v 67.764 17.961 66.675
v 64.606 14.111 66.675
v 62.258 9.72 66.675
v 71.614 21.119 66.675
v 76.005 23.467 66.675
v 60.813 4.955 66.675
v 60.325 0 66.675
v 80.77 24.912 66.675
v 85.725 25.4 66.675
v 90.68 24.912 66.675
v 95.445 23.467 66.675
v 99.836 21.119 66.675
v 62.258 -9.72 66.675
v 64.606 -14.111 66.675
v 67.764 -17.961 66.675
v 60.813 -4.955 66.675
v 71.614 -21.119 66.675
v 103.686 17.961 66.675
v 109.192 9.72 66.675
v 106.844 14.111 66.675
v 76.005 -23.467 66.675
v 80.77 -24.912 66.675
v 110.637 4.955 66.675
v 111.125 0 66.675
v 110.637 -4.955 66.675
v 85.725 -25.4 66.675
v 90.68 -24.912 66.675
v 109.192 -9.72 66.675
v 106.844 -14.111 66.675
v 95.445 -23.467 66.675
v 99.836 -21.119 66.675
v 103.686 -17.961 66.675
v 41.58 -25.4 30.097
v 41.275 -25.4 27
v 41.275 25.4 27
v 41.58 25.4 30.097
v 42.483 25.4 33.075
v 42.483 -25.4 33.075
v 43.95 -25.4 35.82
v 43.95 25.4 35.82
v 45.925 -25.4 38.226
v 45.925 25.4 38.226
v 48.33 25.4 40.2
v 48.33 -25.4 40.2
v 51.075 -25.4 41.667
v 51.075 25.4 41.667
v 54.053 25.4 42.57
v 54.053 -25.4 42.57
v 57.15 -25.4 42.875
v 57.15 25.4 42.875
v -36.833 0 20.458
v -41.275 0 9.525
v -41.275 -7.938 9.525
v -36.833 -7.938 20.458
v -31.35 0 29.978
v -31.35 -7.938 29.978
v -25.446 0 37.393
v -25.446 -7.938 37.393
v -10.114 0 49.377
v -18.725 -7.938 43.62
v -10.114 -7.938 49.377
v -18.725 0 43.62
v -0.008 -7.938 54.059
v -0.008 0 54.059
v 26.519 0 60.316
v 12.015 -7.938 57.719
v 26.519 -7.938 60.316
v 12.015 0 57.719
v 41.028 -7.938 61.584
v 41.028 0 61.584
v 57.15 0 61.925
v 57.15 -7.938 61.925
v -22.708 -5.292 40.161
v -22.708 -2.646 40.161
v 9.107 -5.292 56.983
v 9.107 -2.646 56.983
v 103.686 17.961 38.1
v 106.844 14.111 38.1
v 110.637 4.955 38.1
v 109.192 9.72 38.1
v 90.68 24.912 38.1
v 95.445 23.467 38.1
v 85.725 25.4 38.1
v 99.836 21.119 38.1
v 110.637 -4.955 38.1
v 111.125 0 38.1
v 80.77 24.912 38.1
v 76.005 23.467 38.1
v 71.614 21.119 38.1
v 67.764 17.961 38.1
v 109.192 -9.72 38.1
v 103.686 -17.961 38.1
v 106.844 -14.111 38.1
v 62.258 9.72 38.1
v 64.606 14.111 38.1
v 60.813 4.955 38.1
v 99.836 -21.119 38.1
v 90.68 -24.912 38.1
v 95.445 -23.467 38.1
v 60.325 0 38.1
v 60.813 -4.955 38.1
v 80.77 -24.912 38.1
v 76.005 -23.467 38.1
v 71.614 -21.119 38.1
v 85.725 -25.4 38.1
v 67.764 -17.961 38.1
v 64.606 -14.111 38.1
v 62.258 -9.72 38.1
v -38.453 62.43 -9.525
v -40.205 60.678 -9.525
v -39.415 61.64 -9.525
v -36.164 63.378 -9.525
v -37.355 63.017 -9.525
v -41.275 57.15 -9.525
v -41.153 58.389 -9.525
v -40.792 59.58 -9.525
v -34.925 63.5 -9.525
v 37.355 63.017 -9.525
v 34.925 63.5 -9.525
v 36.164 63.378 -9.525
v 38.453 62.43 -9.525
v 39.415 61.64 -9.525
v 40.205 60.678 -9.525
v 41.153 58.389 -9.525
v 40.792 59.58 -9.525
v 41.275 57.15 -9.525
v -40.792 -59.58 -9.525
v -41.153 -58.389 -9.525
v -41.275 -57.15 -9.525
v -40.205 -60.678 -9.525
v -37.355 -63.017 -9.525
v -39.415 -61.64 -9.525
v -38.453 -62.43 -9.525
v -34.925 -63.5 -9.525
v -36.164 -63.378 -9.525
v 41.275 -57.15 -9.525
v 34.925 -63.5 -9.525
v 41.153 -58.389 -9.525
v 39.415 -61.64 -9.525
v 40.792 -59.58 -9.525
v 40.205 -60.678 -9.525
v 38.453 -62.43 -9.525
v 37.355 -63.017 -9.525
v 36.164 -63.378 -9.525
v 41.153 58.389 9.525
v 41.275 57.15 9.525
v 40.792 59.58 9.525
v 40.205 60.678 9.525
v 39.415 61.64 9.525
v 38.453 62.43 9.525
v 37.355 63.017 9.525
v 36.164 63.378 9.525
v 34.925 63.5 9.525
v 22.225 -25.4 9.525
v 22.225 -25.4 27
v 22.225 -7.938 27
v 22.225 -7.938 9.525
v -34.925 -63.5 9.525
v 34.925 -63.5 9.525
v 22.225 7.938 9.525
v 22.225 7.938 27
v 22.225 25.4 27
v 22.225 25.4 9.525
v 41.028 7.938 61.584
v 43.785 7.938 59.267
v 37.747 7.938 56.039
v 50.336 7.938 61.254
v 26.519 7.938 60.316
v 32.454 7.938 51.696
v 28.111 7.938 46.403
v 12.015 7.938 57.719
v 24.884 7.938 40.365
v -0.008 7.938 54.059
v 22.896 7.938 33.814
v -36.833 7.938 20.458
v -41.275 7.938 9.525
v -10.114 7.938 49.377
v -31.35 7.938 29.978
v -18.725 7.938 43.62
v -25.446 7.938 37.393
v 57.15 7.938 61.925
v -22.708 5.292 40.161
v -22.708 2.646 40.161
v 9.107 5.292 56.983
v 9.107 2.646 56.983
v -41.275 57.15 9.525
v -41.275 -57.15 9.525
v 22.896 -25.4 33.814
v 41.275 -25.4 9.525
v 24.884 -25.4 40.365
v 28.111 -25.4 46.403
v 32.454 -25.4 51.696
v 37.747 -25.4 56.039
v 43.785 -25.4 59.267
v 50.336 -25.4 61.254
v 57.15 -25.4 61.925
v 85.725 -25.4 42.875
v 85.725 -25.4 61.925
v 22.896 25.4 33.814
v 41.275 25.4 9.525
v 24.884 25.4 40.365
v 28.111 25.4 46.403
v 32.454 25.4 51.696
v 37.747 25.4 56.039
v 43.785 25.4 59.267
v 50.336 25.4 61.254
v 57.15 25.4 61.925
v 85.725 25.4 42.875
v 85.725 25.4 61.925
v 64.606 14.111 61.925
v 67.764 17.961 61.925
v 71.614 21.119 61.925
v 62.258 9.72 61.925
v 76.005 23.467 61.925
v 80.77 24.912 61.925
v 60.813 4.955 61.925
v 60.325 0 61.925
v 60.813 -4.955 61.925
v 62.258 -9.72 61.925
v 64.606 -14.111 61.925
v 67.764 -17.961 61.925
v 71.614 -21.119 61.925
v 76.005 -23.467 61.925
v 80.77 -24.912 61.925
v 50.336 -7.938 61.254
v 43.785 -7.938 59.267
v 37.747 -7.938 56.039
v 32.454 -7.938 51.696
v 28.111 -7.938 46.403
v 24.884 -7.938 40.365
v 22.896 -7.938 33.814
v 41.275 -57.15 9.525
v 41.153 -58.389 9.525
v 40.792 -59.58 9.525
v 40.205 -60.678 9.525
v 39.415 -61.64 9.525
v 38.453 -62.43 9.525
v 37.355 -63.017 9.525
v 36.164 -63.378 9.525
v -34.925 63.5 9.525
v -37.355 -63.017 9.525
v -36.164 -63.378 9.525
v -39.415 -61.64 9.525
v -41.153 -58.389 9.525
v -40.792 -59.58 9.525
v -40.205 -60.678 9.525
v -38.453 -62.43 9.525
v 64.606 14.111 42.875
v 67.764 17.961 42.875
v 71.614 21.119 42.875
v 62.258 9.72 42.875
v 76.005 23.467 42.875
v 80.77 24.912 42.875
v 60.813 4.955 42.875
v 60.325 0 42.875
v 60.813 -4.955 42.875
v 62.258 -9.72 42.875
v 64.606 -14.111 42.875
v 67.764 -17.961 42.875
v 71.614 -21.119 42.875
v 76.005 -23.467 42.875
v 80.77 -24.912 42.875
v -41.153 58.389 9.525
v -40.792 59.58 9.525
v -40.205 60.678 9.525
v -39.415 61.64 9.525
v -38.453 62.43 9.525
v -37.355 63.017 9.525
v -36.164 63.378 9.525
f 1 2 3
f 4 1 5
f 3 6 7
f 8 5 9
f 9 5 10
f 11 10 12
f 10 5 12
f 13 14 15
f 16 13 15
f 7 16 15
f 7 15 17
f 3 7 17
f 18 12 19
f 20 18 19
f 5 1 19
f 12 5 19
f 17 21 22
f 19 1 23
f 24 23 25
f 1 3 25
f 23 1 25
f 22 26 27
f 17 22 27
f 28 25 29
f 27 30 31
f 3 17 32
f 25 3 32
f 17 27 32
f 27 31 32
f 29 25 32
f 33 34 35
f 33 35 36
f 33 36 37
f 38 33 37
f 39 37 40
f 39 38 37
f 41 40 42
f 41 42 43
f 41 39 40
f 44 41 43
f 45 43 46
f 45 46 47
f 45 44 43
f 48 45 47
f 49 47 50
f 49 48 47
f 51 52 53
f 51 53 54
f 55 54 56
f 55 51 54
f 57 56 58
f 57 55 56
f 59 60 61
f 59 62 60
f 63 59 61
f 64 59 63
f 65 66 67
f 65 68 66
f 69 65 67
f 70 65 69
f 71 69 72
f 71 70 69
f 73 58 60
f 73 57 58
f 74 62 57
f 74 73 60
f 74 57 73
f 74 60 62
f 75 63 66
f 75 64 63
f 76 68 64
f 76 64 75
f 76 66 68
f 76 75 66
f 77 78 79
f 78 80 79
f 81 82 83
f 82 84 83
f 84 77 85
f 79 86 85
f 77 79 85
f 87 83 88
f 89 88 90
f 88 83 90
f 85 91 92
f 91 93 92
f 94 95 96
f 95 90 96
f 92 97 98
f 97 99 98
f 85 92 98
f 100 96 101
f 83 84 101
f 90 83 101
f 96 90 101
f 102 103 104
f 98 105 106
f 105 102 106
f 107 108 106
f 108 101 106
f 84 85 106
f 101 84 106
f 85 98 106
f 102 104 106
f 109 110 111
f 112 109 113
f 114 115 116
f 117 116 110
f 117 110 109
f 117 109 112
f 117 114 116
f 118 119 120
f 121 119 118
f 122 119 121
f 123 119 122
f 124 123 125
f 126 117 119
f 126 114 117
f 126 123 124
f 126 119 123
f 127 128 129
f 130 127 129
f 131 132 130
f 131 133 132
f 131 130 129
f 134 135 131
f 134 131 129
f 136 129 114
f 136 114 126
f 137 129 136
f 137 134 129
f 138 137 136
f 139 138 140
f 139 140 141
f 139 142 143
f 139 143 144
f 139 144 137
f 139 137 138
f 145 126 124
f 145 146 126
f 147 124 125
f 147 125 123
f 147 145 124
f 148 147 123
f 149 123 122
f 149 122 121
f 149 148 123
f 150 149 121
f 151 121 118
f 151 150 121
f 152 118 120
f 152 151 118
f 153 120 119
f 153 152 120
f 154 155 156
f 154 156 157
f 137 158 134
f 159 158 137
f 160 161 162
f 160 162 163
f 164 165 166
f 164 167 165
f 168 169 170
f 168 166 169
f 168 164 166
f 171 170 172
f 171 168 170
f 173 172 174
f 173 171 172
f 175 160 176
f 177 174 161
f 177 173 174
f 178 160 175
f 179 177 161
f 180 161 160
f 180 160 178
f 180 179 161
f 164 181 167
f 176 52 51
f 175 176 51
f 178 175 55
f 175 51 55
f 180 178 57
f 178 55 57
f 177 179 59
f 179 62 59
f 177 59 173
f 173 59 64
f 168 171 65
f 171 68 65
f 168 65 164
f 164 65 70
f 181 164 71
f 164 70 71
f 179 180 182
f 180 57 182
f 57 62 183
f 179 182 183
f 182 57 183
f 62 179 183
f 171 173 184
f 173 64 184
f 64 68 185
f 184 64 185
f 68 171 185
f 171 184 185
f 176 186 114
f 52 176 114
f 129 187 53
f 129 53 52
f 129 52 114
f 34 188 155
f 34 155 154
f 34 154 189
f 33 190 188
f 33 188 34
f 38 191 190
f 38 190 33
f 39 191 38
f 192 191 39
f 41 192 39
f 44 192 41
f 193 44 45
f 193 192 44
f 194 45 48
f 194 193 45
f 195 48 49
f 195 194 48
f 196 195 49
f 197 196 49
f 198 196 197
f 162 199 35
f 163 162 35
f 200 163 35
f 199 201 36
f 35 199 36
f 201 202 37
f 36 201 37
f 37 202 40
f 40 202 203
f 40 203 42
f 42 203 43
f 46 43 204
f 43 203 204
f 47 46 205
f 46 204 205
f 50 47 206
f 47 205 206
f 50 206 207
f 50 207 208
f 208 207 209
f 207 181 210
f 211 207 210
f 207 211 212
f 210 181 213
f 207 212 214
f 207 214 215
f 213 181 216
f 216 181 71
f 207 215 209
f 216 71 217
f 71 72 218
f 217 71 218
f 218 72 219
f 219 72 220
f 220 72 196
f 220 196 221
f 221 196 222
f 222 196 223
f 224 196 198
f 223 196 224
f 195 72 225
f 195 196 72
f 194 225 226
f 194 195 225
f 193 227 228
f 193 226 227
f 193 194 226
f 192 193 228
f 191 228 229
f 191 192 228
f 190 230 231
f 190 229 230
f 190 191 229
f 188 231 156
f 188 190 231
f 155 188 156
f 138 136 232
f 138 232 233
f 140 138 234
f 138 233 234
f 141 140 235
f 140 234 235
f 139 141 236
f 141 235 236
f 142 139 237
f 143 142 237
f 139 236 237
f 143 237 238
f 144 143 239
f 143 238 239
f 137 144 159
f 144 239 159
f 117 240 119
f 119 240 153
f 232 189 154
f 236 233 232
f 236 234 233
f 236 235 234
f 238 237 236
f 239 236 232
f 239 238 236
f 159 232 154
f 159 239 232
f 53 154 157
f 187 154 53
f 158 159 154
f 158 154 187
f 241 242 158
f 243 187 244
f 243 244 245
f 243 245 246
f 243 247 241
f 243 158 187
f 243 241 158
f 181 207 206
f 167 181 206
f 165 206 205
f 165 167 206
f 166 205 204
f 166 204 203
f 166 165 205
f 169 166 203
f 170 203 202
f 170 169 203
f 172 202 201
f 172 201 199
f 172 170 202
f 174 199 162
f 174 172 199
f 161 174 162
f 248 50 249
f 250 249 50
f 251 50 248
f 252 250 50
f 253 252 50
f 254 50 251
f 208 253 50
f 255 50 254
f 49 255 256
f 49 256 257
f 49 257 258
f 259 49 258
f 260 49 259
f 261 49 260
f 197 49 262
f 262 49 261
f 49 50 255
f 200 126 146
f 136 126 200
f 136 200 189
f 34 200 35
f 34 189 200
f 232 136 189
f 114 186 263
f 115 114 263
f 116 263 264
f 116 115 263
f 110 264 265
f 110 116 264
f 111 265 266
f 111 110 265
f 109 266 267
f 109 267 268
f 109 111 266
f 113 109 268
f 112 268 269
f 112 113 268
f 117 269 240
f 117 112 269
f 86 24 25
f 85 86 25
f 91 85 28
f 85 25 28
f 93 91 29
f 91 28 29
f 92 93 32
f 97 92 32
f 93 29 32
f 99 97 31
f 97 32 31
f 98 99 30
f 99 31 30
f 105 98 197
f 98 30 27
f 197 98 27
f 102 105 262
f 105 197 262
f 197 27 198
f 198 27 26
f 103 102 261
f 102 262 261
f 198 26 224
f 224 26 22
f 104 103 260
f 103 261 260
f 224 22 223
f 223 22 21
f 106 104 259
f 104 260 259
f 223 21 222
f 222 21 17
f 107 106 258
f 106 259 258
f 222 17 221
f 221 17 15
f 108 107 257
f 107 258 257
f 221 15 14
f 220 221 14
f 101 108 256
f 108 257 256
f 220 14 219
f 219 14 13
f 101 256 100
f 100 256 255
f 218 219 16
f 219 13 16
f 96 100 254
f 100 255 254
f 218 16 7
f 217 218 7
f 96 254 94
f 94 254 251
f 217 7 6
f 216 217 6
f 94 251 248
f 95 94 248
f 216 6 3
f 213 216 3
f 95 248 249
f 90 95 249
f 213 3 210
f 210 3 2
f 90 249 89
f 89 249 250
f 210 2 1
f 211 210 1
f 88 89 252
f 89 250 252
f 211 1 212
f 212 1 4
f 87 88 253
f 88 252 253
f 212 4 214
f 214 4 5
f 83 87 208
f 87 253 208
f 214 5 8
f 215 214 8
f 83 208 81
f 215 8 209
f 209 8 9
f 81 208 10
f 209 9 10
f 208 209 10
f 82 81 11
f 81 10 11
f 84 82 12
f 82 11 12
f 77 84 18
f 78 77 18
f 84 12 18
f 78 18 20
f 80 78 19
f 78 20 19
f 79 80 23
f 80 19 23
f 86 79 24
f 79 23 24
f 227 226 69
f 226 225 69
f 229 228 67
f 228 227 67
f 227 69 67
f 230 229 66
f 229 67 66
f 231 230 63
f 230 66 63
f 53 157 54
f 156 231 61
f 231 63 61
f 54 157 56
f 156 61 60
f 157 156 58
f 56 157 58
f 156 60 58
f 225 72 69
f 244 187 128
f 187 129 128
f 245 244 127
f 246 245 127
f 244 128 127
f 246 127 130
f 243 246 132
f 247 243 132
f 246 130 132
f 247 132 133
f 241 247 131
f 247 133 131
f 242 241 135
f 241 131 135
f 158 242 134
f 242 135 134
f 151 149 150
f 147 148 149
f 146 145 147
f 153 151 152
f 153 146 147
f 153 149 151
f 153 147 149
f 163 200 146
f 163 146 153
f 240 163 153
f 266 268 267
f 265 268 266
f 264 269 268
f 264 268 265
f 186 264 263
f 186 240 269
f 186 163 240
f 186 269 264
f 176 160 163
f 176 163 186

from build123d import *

# Parameters (mm, degrees)
F1_DEPTH = 63.5
F2_DEPTH = 25.4
F3_DEPTH = 7.9375
F0_W     = 25.4
F0_H     = 19.05
F4_DEPTH = 25.4
F6_R     = 6.35


# Not quite as in the source:
# - a feature names something its author has since deleted; it is built from what else it names


with BuildPart() as f1:
    # F0 (on Front) → F1 (new body, symmetric)
    with BuildSketch(Plane.XZ):
        Polygon((22.225, 9.525), (-41.275, 9.525), (-41.275, -9.525), (41.275, -9.525), (41.275, 9.525), align=None)
    extrude(amount=F1_DEPTH, both=True)

    # F0 (on Front) → F2 (join, symmetric)
    with BuildSketch(Plane.XZ):
        with BuildLine():
            Line((22.225, 27.0002), (22.225, 9.525))
            Line((22.225, 9.525), (41.275, 9.525))
            Line((41.275, 9.525), (41.275, 27.0002))
            ThreePointArc((41.275, 27.0002), (45.9246798487, 38.2255201513), (57.15, 42.8752))
            Line((57.15, 42.8752), (60.325, 42.8752))
            Line((60.325, 42.8752), (60.325, 61.9252))
            Line((60.325, 61.9252), (57.15, 61.9252))
            ThreePointArc((57.15, 61.9252), (32.4542956671, 51.6959043329), (22.225, 27.0002))
        make_face()
    extrude(amount=F2_DEPTH, both=True)

    # F0 (on Front) → F3 (join, symmetric)
    with BuildSketch(Plane.XZ):
        with BuildLine():
            add(Edge.make_bspline(
                [(-41.275, 9.525), (-28.3377878368, 47.713726759), (0, 62.2769519687), (57.15, 61.9252)],
                knots=[0, 0, 0, 0, 111.5045361635, 111.5045361635, 111.5045361635, 111.5045361635], degree=3))
            Line((-41.275, 9.525), (22.225, 9.525))
            Line((22.225, 9.525), (22.225, 27.0002))
            ThreePointArc((22.225, 27.0002), (32.4542956671, 51.6959043329), (57.15, 61.9252))
        make_face()
    extrude(amount=F3_DEPTH, both=True)

    # F0 (on Front) → F4 (join, symmetric)
    with BuildSketch(Plane.XZ):
        with Locations((73.025, 52.4002)):
            Rectangle(F0_W, F0_H)
    extrude(amount=F4_DEPTH, both=True)

    # F0 (on Front) → F5 (revolve)
    with BuildSketch(Plane.XZ):
        Polygon((85.725, 66.675), (85.725, 61.9252), (85.725, 42.8752), (85.725, 38.1), (111.125, 38.1), (111.125, 66.675), align=None)
    revolve(axis=Axis((85.725, 0, 52.3875), (0, 0, -1)))

    # F6
    f6_edges = [f1.edges().sort_by_distance(p)[0] for p in [
        (-41.275, -63.5, 0),
        (41.275, -63.5, 0),
        (41.275, 63.5, 0),
        (-41.275, 63.5, 0),
    ]]
    fillet(f6_edges, radius=F6_R)


solid = f1.part
